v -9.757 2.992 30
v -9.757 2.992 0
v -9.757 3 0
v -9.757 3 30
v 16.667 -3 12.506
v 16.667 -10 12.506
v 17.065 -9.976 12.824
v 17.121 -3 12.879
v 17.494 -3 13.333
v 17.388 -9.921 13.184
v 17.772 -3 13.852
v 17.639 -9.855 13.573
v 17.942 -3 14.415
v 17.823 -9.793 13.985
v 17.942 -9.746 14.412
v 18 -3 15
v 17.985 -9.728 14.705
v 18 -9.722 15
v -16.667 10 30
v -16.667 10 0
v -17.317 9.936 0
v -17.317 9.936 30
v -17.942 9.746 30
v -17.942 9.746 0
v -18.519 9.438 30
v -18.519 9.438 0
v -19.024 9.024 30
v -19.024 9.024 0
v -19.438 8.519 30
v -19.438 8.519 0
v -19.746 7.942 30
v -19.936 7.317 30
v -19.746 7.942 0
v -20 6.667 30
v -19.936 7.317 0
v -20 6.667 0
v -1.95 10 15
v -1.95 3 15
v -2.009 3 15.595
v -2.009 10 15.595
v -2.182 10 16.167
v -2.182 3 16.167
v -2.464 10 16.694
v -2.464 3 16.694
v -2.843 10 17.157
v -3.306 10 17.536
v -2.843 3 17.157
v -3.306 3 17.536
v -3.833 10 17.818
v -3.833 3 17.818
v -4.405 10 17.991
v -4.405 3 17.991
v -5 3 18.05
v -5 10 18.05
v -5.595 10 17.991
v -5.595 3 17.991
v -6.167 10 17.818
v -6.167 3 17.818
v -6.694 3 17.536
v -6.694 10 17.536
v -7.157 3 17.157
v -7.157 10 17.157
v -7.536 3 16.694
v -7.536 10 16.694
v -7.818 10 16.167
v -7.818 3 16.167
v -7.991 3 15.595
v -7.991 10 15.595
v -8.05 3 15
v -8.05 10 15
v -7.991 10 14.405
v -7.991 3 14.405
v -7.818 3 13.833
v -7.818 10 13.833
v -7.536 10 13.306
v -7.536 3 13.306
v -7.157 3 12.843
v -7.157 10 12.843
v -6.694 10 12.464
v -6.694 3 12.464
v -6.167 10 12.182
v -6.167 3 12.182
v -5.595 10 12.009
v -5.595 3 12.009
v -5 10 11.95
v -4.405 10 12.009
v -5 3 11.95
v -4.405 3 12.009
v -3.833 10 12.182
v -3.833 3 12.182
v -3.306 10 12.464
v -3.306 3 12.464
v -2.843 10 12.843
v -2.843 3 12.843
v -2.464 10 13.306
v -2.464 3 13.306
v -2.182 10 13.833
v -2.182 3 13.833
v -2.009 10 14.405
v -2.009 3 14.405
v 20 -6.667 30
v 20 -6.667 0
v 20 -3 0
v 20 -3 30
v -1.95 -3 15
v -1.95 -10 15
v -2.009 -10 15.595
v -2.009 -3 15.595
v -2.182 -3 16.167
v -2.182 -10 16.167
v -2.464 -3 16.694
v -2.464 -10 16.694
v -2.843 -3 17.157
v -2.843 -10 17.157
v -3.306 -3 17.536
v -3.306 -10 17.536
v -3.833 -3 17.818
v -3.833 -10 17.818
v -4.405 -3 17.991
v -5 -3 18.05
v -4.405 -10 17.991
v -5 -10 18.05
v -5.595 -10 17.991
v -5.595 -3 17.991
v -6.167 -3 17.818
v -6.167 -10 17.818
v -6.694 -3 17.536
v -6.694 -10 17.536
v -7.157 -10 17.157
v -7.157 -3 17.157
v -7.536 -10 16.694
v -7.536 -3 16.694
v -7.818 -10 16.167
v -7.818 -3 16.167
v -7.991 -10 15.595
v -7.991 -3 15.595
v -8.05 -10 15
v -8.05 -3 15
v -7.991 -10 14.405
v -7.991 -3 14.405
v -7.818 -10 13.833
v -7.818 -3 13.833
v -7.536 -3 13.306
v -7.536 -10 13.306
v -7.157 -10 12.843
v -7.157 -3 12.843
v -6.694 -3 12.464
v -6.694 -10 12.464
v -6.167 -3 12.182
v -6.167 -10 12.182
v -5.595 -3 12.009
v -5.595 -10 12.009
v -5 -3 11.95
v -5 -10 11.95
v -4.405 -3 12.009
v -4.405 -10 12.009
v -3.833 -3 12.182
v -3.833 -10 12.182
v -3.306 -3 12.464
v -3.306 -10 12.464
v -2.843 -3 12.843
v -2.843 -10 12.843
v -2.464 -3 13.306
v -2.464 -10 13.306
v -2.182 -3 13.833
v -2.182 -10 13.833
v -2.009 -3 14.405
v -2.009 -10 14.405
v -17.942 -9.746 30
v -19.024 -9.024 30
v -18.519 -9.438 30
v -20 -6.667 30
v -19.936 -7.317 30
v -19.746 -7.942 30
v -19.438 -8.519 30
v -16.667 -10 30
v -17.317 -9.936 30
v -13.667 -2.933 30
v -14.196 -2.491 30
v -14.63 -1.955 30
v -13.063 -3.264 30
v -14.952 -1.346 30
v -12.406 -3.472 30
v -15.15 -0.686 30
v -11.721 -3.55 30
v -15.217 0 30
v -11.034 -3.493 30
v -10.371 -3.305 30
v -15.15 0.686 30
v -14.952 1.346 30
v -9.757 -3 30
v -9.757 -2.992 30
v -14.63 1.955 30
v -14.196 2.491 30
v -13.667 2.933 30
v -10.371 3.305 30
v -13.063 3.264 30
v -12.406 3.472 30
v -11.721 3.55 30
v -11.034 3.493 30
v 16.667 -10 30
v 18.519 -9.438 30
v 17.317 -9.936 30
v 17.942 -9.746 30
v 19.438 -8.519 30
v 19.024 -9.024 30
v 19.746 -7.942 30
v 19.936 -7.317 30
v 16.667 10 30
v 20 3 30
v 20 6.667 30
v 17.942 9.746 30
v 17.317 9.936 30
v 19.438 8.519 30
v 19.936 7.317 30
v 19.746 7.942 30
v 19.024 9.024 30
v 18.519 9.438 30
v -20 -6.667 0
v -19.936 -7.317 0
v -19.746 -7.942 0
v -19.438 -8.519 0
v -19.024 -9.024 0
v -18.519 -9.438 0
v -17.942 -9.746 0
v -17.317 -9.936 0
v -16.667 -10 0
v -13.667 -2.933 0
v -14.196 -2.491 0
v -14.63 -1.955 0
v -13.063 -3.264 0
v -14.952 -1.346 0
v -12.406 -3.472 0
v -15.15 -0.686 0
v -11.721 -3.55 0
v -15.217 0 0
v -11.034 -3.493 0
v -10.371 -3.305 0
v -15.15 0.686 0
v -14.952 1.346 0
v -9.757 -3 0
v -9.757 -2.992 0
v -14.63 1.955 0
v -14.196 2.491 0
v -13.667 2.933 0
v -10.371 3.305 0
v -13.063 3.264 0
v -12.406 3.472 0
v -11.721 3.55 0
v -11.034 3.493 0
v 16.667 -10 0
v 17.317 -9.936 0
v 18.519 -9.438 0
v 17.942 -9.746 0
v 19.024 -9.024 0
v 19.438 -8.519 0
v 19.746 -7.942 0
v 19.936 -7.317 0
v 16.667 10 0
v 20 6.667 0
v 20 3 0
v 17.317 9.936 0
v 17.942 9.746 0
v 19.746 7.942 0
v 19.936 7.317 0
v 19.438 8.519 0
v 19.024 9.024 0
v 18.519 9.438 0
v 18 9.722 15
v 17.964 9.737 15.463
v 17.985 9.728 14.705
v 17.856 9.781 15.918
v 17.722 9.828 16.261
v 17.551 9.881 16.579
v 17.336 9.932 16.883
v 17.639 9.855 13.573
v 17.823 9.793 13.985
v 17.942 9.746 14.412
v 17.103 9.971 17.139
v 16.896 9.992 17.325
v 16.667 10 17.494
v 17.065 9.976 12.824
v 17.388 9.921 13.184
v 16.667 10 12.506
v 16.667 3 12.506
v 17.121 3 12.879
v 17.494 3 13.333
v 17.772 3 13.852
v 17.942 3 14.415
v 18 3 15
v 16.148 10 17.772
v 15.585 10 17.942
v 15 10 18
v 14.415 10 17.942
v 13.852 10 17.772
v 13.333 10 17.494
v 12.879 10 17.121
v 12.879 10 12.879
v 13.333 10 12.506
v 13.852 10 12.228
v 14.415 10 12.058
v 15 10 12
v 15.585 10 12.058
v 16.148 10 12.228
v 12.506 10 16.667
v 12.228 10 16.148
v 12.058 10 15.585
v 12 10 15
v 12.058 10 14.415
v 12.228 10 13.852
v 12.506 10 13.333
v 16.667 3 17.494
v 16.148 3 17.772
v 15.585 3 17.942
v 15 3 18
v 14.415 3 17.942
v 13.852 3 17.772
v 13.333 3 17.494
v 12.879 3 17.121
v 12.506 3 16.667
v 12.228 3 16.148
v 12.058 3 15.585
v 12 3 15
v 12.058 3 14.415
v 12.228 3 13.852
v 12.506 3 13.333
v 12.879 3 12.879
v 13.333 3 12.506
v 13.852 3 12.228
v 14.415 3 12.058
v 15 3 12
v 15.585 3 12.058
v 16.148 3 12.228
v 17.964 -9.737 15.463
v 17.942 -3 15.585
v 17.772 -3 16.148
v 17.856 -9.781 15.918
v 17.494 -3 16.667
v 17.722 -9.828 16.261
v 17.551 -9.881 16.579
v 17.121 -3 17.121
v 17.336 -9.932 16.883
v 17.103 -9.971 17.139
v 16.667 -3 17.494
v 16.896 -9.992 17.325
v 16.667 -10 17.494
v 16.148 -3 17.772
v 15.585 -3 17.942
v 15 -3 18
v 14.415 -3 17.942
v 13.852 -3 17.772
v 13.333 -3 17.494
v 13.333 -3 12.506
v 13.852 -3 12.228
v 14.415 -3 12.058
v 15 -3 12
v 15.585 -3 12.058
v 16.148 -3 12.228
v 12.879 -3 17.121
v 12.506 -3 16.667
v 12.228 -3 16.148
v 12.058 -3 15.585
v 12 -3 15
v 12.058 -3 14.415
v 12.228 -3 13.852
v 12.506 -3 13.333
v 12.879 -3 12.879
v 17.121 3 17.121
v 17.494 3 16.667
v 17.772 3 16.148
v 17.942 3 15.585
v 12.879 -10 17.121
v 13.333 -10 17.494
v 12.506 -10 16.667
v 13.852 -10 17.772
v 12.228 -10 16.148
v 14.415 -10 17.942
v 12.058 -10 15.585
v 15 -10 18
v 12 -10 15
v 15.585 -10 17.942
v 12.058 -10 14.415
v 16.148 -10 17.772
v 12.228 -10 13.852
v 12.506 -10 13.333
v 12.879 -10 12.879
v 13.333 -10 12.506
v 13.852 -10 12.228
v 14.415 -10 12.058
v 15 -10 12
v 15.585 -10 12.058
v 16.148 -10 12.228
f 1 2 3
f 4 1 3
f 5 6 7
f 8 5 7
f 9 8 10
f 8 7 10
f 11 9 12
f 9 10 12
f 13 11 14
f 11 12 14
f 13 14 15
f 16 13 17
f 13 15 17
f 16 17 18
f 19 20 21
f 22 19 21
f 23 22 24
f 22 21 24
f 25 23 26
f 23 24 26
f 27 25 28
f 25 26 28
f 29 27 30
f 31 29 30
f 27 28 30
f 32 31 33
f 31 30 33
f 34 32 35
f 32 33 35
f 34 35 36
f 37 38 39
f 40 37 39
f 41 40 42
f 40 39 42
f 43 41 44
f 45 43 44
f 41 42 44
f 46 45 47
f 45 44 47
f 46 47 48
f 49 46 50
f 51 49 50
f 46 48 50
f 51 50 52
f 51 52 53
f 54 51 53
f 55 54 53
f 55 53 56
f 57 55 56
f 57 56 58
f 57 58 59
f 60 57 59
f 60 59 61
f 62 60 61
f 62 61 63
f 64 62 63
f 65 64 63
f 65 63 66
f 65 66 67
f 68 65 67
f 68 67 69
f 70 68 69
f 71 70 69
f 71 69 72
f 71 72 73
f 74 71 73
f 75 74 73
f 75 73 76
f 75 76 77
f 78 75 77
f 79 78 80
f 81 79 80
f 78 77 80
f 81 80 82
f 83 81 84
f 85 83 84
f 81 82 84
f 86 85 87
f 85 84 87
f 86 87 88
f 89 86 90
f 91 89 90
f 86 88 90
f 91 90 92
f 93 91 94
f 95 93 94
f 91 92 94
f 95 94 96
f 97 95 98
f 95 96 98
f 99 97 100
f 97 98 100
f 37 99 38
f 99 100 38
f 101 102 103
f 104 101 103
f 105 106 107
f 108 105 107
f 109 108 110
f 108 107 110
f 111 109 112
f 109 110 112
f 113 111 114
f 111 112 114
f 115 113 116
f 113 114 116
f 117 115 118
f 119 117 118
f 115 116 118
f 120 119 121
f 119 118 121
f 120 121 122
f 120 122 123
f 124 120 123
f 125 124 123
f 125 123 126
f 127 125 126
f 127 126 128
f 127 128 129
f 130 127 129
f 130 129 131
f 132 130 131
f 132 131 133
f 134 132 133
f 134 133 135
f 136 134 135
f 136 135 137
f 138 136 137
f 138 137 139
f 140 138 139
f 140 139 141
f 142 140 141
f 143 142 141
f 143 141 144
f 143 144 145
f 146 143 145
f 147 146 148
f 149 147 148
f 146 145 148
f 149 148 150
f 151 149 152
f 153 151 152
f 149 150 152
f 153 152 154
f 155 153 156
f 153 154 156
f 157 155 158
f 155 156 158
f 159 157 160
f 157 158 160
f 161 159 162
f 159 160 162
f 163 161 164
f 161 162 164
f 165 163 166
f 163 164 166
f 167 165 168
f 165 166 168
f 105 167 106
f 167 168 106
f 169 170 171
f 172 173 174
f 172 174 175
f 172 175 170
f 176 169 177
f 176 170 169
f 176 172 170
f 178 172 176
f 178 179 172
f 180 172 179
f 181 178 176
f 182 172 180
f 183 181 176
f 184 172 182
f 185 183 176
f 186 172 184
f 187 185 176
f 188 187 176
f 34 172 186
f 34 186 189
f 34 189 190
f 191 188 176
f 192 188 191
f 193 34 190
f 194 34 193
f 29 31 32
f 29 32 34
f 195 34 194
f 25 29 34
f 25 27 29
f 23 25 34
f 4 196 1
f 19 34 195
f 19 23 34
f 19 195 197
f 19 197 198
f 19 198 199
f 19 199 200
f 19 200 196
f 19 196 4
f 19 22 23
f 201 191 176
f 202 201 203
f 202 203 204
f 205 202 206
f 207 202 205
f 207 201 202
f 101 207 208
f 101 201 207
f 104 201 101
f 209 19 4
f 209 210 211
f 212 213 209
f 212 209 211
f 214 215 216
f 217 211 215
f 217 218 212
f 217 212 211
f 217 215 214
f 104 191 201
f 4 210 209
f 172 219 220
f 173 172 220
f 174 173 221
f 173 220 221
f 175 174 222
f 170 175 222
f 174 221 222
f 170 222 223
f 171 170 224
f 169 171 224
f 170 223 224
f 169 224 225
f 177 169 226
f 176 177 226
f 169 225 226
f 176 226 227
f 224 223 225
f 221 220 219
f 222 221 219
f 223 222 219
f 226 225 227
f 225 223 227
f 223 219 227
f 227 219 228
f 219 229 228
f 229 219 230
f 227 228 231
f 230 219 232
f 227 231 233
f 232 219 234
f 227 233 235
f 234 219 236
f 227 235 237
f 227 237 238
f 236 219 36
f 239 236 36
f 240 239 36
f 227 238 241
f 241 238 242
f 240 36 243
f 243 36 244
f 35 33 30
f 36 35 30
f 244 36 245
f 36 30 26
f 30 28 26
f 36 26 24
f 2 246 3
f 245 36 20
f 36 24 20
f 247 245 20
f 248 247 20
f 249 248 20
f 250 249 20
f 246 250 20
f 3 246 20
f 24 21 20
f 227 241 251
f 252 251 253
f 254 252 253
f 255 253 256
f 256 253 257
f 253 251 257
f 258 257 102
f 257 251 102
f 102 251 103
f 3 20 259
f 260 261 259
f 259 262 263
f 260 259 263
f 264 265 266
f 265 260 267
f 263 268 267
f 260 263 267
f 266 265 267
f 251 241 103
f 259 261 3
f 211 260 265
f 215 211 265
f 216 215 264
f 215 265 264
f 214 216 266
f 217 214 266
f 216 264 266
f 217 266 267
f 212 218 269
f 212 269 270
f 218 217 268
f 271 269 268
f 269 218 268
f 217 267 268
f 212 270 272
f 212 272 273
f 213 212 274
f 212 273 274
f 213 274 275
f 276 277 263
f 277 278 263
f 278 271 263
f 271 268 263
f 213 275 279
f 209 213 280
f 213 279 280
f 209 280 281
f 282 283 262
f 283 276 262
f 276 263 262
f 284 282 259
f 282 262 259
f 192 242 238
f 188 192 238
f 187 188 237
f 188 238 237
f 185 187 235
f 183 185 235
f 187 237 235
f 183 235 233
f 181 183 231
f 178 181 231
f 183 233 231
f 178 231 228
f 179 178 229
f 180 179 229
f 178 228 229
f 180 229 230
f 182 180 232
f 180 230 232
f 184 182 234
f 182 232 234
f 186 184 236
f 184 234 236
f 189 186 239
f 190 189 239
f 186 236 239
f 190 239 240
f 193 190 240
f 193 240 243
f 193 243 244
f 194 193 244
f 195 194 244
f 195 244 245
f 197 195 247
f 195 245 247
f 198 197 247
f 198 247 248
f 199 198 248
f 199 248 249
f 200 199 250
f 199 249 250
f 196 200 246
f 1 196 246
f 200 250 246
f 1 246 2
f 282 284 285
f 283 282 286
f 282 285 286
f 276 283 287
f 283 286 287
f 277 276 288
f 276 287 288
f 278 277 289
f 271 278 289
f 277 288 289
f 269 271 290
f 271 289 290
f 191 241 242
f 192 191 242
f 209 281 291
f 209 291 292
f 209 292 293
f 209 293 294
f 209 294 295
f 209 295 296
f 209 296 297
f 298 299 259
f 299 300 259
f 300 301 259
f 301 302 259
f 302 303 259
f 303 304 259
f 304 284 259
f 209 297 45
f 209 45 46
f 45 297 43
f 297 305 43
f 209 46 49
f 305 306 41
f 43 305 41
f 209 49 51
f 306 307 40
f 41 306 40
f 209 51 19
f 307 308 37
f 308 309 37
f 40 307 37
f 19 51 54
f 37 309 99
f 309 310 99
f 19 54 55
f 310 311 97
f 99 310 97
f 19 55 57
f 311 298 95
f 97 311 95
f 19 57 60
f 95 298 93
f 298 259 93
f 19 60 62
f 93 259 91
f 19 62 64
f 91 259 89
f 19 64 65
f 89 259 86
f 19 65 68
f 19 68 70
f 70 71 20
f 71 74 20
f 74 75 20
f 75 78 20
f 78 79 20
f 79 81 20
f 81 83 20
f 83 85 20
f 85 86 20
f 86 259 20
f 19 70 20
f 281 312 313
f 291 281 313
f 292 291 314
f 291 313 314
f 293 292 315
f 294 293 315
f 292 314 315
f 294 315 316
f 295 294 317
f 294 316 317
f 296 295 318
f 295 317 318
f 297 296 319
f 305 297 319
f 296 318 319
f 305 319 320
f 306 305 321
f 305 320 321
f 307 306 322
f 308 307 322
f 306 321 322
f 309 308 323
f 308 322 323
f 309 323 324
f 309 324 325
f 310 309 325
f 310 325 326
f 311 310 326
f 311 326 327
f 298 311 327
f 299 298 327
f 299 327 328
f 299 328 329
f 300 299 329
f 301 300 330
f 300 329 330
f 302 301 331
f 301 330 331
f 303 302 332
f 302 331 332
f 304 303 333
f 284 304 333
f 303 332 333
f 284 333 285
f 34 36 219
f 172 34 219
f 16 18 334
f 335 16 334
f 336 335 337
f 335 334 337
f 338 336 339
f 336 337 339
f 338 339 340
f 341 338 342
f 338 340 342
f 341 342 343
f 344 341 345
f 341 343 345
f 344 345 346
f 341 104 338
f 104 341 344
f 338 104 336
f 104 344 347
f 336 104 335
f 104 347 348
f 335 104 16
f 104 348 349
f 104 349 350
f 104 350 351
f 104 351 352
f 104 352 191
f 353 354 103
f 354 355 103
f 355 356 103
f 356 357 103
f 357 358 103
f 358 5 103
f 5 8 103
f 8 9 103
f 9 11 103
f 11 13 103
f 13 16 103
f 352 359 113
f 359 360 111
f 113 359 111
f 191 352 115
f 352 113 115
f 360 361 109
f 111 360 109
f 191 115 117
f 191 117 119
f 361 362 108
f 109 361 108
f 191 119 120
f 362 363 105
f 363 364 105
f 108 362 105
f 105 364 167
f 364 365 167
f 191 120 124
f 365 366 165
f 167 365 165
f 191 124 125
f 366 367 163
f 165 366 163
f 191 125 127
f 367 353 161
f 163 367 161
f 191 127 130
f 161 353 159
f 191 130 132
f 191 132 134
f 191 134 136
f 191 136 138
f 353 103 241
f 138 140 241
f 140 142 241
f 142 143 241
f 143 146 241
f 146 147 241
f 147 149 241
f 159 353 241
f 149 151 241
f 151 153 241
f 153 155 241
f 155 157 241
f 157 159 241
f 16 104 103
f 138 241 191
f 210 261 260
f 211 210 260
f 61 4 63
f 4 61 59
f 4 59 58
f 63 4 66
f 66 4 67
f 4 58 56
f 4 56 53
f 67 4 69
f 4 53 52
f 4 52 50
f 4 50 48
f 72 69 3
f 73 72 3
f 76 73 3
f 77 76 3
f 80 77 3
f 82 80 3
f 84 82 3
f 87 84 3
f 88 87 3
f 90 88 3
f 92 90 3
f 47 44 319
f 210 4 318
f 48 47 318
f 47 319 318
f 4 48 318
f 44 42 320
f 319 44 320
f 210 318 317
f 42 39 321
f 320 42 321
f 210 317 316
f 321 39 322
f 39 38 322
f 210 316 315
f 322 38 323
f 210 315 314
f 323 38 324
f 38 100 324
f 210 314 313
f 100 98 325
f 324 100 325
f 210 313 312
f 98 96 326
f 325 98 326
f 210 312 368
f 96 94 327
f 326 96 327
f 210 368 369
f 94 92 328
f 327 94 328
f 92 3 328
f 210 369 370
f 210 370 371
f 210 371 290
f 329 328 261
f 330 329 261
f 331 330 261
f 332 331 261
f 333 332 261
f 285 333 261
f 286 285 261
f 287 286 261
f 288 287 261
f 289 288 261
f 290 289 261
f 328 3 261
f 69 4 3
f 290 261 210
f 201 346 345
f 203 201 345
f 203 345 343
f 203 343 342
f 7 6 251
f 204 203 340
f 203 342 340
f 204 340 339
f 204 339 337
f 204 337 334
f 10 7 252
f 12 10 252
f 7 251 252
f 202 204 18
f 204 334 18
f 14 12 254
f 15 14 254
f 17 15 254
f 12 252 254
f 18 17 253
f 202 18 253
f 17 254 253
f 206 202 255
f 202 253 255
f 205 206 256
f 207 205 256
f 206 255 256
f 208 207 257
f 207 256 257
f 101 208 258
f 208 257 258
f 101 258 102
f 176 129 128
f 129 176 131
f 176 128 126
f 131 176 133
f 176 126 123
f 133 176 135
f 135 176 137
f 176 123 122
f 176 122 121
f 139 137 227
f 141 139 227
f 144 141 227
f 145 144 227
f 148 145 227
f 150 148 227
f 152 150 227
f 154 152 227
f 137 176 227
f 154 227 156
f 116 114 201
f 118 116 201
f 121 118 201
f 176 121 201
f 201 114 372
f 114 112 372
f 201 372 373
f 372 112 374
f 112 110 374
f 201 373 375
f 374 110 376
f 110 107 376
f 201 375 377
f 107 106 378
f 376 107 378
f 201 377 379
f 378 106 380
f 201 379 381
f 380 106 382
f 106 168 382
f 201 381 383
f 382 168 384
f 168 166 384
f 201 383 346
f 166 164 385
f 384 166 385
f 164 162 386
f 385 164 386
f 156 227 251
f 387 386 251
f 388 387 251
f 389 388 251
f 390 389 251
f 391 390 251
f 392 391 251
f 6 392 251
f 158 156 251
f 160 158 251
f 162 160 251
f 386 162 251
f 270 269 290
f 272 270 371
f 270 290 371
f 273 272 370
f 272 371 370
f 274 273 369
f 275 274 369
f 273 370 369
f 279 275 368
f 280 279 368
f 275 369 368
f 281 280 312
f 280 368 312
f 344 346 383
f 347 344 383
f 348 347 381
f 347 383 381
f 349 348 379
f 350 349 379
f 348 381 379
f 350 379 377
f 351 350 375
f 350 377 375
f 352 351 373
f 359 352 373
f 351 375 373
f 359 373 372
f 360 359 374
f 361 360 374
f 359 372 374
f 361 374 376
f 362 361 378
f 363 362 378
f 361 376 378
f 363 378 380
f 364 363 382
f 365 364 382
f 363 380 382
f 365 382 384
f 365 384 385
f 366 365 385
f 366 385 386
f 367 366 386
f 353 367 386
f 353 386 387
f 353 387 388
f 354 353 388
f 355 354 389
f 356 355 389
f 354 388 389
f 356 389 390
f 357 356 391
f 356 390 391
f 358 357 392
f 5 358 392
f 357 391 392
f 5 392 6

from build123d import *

# Parameters (mm, degrees)
F1_DEPTH = 30
F2_R     = 3.05
F3_DEPTH = 30


with BuildPart() as f1:
    # F0 (on Top) → F1 (new body)
    with BuildSketch(Plane.XY):
        with BuildLine():
            Line((-20, 6.6666666667), (-20, -6.6666666667))
            ThreePointArc((-20, -6.6666666667), (-19.0236892706, -9.0236892706), (-16.6666666667, -10))
            Line((-16.6666666667, -10), (16.6666666667, -10))
            ThreePointArc((16.6666666667, -10), (19.0236892706, -9.0236892706), (20, -6.6666666667))
            Line((20, -6.6666666667), (20, -3))
            Line((20, -3), (-9.7565921577, -3))
            Line((-9.7565921577, -3), (-9.7565921577, -2.9923427896))
            ThreePointArc((-9.7565921577, -2.9923427896), (-15.2166666667, 0), (-9.7565921577, 2.9923427896))
            Line((-9.7565921577, 2.9923427896), (-9.7565921577, 3))
            Line((-9.7565921577, 3), (20, 3))
            Line((20, 3), (20, 6.6666666667))
            ThreePointArc((20, 6.6666666667), (19.0236892706, 9.0236892706), (16.6666666667, 10))
            Line((16.6666666667, 10), (-16.6666666667, 10))
            ThreePointArc((-16.6666666667, 10), (-19.0236892706, 9.0236892706), (-20, 6.6666666667))
        make_face()
    extrude(amount=F1_DEPTH)

    # F2 (on face) → F3 (cut)
    with BuildSketch(Plane.XZ.offset(10)):
        with Locations((-5, 15)):
            Circle(F2_R)
        with BuildLine():
            Line((16.6666666667, 12.5055617422), (16.6666666667, 17.4944382578))
            ThreePointArc((16.6666666667, 17.4944382578), (12, 15), (16.6666666667, 12.5055617422))
        make_face()
        with BuildLine():
            ThreePointArc((16.6666666667, 12.5055617422), (17.6457513111, 13.5857864376), (18, 15))
            ThreePointArc((18, 15), (17.6457513111, 16.4142135624), (16.6666666667, 17.4944382578))
            Line((16.6666666667, 17.4944382578), (16.6666666667, 12.5055617422))
        make_face()
    extrude(amount=-F3_DEPTH, mode=Mode.SUBTRACT)


solid = f1.part
